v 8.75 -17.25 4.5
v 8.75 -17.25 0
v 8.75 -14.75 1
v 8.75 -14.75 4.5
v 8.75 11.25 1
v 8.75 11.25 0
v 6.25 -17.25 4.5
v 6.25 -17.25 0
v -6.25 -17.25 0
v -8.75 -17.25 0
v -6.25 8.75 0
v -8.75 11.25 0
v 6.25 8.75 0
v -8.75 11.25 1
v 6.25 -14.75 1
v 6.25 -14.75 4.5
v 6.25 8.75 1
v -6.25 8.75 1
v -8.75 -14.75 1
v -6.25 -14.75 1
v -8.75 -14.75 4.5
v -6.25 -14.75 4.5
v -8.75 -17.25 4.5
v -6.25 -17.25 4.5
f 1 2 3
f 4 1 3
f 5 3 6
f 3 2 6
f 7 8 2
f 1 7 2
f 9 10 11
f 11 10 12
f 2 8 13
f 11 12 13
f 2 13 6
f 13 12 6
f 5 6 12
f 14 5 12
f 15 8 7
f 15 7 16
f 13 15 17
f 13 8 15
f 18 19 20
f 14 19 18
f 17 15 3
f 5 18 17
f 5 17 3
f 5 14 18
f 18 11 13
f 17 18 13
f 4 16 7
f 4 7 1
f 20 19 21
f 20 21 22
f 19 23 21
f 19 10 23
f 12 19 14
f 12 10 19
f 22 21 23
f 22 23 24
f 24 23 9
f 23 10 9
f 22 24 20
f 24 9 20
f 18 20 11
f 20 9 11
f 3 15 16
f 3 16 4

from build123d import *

# Parameters (mm, degrees)
SKETCH1_W           = 2.5
SKETCH1_H           = 26
BOSS_EXTRUDE1_DEPTH = 1
SKETCH2_W           = 2.5
SKETCH2_H           = 2.5
BOSS_EXTRUDE2_DEPTH = 3.5


with BuildPart() as part:
    # Sketch1 → Boss-Extrude1 (new body)
    with BuildSketch(Plane.XY):
        with Locations((-7.5, -4.25)):
            Rectangle(SKETCH1_W, SKETCH1_H)
        Polygon((-8.75, 11.25), (-8.75, 8.75), (-6.25, 8.75), (6.25, 8.75), (8.75, 8.75), (8.75, 11.25), align=None)
        with Locations((7.5, -4.25)):
            Rectangle(SKETCH1_W, SKETCH1_H)
    extrude(amount=BOSS_EXTRUDE1_DEPTH)

    # Sketch2 → Boss-Extrude2 (add)
    with BuildSketch(Plane.XY.offset(1)):
        with Locations((-7.5, -16)):
            Rectangle(SKETCH2_W, SKETCH2_H)
        with Locations((7.5, -16)):
            Rectangle(SKETCH2_W, SKETCH2_H)
    extrude(amount=BOSS_EXTRUDE2_DEPTH)


solid = part.part
